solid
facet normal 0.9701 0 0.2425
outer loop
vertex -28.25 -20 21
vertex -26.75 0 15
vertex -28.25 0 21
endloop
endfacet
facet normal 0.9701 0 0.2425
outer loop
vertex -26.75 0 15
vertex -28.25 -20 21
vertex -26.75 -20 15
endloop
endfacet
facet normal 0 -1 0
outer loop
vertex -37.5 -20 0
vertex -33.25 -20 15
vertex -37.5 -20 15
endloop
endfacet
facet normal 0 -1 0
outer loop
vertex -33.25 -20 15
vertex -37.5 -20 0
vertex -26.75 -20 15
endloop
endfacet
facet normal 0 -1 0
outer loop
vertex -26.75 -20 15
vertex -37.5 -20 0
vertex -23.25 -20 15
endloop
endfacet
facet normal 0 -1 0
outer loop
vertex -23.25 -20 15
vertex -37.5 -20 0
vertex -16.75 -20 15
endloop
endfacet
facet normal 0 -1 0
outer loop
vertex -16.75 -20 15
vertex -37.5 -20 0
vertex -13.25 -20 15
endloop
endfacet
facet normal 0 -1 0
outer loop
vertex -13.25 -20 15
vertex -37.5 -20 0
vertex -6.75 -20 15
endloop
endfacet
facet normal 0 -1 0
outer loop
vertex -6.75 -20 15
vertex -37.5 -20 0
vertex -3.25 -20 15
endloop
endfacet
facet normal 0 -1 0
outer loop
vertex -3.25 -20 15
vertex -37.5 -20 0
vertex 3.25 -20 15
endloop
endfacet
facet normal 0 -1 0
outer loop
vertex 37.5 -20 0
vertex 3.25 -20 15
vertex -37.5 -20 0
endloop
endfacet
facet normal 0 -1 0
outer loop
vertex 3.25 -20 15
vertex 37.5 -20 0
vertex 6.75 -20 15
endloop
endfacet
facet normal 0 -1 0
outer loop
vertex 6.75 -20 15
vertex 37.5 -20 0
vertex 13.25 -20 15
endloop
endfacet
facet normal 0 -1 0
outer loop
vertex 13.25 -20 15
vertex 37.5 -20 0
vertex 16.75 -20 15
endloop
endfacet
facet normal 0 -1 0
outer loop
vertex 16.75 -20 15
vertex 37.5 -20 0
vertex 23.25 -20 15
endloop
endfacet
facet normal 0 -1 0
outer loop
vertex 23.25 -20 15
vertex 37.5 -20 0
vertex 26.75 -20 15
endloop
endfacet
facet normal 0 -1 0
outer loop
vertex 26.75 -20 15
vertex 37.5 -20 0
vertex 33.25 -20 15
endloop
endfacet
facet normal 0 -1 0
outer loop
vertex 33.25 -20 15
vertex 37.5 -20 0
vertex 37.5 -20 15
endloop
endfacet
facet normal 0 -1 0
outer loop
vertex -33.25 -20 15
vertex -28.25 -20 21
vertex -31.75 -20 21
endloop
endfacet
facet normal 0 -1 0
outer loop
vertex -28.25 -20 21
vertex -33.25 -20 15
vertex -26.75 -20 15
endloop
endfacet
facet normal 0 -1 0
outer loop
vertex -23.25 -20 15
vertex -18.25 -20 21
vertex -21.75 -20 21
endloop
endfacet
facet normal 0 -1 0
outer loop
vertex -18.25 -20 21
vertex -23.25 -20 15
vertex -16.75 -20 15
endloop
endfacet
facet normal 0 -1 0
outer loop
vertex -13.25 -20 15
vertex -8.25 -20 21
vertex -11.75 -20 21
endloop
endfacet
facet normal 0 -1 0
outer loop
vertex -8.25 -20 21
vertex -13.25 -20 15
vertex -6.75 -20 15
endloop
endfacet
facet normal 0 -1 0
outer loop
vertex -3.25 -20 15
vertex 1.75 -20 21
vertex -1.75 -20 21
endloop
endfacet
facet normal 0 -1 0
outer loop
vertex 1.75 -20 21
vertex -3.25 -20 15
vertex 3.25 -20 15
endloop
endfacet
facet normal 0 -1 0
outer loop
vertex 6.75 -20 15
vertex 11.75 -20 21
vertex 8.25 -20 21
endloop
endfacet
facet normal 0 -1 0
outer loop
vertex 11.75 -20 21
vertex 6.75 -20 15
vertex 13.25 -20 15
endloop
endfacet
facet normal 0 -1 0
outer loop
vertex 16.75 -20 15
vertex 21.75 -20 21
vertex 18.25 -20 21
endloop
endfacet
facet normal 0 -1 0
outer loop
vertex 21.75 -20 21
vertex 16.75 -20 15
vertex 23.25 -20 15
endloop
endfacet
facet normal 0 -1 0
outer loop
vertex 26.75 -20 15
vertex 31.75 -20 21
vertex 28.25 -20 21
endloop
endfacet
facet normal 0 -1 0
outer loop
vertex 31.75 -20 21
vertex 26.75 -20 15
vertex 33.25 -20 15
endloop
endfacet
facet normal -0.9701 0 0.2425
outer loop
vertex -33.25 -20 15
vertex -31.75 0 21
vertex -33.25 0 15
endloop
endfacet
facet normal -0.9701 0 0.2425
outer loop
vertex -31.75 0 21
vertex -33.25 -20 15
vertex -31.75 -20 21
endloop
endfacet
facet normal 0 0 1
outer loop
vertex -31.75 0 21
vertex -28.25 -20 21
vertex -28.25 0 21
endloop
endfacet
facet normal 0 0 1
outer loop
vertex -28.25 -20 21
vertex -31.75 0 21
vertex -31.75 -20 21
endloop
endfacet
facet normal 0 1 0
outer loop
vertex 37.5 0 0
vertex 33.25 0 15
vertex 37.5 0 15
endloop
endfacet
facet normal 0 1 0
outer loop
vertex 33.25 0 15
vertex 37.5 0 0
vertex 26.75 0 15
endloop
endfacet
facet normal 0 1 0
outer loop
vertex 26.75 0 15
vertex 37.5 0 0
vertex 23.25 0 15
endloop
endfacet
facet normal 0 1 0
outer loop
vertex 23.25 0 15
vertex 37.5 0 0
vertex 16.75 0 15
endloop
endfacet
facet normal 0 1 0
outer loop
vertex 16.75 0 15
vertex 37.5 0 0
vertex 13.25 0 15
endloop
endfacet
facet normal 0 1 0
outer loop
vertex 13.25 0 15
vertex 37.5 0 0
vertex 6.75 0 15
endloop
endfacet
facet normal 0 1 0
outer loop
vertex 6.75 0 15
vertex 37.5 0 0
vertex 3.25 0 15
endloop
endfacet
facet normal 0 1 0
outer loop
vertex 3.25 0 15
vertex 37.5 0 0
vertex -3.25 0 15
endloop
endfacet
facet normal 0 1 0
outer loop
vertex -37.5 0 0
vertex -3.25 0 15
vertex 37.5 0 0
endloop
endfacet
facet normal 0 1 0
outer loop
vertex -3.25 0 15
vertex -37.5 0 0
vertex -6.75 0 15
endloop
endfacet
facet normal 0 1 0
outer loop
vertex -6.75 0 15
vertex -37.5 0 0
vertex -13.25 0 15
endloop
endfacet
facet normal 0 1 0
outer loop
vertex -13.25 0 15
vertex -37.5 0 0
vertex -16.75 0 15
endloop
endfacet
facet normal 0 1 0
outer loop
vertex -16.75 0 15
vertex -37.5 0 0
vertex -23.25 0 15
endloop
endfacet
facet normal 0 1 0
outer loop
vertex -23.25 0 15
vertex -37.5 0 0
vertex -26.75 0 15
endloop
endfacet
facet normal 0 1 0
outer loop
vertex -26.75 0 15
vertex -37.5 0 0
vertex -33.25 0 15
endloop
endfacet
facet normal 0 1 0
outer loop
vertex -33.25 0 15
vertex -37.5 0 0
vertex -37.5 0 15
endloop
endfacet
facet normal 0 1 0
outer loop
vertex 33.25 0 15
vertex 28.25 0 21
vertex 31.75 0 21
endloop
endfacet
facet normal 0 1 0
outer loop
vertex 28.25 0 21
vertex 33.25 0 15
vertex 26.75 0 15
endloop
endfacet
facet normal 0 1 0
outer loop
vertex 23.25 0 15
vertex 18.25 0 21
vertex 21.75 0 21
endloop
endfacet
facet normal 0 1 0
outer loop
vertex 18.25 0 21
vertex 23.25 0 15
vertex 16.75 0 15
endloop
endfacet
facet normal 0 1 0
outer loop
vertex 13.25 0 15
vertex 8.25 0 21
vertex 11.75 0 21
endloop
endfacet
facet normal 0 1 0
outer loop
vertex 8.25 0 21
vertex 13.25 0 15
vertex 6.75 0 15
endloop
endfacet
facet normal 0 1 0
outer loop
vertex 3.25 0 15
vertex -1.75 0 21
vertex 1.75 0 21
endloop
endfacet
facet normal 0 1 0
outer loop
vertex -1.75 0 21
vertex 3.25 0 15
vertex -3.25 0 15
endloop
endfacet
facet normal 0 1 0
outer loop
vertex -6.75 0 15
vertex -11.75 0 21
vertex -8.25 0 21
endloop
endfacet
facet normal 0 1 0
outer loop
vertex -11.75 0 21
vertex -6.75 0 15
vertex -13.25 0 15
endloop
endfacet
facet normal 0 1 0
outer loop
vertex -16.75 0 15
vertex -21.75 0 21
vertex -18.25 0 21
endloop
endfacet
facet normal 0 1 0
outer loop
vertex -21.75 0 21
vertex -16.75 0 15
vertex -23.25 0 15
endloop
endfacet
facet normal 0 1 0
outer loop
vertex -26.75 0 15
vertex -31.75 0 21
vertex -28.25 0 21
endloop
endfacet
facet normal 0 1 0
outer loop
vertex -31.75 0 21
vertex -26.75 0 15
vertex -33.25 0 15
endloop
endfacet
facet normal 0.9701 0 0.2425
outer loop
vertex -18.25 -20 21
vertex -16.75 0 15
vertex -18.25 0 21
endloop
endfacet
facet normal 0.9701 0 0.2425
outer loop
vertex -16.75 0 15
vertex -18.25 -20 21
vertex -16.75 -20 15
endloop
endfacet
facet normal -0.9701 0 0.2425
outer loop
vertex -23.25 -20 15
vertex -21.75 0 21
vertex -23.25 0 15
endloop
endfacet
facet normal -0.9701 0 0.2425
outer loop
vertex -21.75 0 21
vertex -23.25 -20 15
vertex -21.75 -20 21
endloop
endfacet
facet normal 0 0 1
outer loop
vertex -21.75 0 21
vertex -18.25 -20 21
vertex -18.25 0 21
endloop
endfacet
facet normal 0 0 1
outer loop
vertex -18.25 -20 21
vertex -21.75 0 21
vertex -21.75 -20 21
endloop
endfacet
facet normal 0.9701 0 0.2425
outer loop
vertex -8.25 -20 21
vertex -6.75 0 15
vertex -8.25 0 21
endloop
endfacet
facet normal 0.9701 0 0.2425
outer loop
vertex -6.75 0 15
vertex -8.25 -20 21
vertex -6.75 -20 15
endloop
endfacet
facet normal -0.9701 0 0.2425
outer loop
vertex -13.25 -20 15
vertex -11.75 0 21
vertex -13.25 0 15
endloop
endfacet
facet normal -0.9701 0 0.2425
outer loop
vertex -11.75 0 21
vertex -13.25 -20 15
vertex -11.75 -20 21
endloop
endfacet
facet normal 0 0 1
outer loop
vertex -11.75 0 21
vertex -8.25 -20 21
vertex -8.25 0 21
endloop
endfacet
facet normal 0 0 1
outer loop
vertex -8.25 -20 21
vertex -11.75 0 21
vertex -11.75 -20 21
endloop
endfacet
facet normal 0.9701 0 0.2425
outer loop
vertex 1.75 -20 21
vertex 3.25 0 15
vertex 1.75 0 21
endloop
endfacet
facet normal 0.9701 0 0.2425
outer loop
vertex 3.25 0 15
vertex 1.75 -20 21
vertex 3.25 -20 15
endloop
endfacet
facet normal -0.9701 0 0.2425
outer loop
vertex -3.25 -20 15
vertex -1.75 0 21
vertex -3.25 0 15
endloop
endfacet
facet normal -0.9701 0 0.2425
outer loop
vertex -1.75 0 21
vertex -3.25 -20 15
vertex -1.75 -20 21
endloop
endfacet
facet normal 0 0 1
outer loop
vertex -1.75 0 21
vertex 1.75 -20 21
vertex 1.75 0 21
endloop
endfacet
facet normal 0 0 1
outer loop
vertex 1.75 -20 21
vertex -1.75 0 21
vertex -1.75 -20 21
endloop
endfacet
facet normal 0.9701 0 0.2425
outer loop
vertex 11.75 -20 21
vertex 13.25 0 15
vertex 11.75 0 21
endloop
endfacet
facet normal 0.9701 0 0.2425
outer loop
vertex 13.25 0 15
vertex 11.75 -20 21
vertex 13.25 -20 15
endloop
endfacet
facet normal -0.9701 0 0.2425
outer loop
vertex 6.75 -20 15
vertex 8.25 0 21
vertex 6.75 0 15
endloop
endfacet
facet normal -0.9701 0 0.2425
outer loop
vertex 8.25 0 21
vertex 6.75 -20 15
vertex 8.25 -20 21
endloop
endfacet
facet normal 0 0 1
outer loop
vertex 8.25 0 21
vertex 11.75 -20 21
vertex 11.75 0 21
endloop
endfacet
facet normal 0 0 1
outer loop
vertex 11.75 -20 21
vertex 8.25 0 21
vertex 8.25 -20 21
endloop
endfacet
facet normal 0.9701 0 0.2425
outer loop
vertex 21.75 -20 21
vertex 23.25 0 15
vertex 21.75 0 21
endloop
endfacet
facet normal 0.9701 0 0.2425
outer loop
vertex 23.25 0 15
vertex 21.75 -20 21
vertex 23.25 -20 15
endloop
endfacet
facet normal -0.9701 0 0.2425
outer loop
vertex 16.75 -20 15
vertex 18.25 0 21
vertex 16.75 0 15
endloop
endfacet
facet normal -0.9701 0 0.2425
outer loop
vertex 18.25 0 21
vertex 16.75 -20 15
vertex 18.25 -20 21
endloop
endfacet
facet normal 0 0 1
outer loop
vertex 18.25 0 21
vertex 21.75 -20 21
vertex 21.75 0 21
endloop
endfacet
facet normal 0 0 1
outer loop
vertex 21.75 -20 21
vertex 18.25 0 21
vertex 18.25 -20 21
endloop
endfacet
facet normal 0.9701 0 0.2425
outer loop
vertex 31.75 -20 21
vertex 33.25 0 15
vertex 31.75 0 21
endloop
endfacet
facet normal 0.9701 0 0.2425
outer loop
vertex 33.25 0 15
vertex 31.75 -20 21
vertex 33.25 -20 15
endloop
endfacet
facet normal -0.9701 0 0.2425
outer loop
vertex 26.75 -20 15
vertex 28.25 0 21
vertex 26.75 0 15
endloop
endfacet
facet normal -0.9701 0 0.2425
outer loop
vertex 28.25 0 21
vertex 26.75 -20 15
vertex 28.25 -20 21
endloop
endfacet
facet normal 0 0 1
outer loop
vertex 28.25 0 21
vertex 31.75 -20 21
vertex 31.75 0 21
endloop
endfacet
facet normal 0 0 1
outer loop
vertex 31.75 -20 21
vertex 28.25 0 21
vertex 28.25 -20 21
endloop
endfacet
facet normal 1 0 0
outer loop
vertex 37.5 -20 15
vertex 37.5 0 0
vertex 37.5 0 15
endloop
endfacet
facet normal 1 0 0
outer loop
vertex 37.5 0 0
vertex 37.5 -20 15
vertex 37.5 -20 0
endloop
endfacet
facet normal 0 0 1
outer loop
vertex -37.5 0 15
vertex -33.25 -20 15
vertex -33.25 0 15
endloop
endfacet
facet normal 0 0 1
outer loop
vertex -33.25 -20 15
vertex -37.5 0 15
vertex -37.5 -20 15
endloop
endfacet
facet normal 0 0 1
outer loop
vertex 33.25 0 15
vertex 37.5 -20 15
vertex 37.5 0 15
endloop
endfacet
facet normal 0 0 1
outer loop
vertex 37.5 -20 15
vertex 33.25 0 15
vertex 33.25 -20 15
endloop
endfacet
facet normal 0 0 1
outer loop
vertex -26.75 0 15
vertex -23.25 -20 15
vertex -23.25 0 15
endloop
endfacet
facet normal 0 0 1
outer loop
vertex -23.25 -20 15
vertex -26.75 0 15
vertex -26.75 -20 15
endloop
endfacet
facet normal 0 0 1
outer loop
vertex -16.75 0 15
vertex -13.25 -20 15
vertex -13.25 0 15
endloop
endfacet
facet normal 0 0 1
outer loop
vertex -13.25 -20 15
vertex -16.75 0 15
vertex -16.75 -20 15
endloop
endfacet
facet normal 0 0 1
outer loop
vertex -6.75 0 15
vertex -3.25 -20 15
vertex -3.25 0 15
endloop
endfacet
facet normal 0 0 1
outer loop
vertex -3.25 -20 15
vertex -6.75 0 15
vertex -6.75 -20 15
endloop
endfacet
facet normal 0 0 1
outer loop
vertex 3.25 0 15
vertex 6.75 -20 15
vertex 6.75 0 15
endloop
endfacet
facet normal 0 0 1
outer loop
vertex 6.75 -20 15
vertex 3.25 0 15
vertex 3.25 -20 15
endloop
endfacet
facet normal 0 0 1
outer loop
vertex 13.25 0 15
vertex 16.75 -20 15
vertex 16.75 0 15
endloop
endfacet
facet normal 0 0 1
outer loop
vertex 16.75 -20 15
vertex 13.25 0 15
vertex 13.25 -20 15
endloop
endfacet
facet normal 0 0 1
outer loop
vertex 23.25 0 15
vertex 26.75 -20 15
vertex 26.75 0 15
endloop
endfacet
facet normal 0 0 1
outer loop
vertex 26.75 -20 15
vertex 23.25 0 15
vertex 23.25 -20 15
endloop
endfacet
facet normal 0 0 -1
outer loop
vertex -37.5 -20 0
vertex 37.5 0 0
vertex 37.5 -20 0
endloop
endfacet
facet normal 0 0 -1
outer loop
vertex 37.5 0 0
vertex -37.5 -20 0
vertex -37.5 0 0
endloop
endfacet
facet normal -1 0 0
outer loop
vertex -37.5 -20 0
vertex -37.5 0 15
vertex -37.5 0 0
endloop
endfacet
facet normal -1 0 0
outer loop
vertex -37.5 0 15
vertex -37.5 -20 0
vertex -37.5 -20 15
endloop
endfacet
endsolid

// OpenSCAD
$fn = 32;

// ----------------------------------------------------------------------
// Toothed rack, 7 teeth
// 10 mm pitch, 6 mm teeth
// ----------------------------------------------------------------------

// --- parameters (mm) ---
bar_w = 20;     // bar width (Y)
bar_h = 15;     // bar height (Z)
teeth = 7;      // number of teeth
pitch = 10;     // tooth pitch
tooth_h = 6;    // tooth height above the bar
root_w = 7;     // tooth width at the root
crest_w = 3.5;  // tooth width at the crest

// --- derived feature positions (mm) ---
span = (teeth - 1) * pitch;  // = 60   distance between the outer teeth
bar_l = span + root_w + 8;   // = 75   bar length: teeth plus 4 mm at each end
tooth_x = -span / 2;         // = -30   X of the first tooth
height = bar_h + tooth_h;    // = 21   overall height
feature_centers = [
  [tooth_x + 0 * pitch, -bar_w / 2],
  [tooth_x + 1 * pitch, -bar_w / 2],
  [tooth_x + 2 * pitch, -bar_w / 2],
  [tooth_x + 3 * pitch, -bar_w / 2],
  [tooth_x + 4 * pitch, -bar_w / 2],
  [tooth_x + 5 * pitch, -bar_w / 2],
  [tooth_x + 6 * pitch, -bar_w / 2]
];   // tooth centre line, drives the tooth loop

// bar with a rack of teeth, one extruded trapezoium per centre
module rack_tooth() {
  linear_extrude(height = bar_w)
    polygon(points = [
      [0, 0],
      [root_w, 0],
      [root_w / 2 + crest_w / 2, tooth_h + 1],
      [root_w / 2 - crest_w / 2, tooth_h + 1]
    ]);
}

union() {
  translate([-bar_l / 2, -bar_w, 0]) cube([bar_l, bar_w, bar_h]);
  for (centre = feature_centers)
    translate([centre[0] - root_w / 2, 0, bar_h - 1]) rotate([90, 0, 0]) rack_tooth();
}
